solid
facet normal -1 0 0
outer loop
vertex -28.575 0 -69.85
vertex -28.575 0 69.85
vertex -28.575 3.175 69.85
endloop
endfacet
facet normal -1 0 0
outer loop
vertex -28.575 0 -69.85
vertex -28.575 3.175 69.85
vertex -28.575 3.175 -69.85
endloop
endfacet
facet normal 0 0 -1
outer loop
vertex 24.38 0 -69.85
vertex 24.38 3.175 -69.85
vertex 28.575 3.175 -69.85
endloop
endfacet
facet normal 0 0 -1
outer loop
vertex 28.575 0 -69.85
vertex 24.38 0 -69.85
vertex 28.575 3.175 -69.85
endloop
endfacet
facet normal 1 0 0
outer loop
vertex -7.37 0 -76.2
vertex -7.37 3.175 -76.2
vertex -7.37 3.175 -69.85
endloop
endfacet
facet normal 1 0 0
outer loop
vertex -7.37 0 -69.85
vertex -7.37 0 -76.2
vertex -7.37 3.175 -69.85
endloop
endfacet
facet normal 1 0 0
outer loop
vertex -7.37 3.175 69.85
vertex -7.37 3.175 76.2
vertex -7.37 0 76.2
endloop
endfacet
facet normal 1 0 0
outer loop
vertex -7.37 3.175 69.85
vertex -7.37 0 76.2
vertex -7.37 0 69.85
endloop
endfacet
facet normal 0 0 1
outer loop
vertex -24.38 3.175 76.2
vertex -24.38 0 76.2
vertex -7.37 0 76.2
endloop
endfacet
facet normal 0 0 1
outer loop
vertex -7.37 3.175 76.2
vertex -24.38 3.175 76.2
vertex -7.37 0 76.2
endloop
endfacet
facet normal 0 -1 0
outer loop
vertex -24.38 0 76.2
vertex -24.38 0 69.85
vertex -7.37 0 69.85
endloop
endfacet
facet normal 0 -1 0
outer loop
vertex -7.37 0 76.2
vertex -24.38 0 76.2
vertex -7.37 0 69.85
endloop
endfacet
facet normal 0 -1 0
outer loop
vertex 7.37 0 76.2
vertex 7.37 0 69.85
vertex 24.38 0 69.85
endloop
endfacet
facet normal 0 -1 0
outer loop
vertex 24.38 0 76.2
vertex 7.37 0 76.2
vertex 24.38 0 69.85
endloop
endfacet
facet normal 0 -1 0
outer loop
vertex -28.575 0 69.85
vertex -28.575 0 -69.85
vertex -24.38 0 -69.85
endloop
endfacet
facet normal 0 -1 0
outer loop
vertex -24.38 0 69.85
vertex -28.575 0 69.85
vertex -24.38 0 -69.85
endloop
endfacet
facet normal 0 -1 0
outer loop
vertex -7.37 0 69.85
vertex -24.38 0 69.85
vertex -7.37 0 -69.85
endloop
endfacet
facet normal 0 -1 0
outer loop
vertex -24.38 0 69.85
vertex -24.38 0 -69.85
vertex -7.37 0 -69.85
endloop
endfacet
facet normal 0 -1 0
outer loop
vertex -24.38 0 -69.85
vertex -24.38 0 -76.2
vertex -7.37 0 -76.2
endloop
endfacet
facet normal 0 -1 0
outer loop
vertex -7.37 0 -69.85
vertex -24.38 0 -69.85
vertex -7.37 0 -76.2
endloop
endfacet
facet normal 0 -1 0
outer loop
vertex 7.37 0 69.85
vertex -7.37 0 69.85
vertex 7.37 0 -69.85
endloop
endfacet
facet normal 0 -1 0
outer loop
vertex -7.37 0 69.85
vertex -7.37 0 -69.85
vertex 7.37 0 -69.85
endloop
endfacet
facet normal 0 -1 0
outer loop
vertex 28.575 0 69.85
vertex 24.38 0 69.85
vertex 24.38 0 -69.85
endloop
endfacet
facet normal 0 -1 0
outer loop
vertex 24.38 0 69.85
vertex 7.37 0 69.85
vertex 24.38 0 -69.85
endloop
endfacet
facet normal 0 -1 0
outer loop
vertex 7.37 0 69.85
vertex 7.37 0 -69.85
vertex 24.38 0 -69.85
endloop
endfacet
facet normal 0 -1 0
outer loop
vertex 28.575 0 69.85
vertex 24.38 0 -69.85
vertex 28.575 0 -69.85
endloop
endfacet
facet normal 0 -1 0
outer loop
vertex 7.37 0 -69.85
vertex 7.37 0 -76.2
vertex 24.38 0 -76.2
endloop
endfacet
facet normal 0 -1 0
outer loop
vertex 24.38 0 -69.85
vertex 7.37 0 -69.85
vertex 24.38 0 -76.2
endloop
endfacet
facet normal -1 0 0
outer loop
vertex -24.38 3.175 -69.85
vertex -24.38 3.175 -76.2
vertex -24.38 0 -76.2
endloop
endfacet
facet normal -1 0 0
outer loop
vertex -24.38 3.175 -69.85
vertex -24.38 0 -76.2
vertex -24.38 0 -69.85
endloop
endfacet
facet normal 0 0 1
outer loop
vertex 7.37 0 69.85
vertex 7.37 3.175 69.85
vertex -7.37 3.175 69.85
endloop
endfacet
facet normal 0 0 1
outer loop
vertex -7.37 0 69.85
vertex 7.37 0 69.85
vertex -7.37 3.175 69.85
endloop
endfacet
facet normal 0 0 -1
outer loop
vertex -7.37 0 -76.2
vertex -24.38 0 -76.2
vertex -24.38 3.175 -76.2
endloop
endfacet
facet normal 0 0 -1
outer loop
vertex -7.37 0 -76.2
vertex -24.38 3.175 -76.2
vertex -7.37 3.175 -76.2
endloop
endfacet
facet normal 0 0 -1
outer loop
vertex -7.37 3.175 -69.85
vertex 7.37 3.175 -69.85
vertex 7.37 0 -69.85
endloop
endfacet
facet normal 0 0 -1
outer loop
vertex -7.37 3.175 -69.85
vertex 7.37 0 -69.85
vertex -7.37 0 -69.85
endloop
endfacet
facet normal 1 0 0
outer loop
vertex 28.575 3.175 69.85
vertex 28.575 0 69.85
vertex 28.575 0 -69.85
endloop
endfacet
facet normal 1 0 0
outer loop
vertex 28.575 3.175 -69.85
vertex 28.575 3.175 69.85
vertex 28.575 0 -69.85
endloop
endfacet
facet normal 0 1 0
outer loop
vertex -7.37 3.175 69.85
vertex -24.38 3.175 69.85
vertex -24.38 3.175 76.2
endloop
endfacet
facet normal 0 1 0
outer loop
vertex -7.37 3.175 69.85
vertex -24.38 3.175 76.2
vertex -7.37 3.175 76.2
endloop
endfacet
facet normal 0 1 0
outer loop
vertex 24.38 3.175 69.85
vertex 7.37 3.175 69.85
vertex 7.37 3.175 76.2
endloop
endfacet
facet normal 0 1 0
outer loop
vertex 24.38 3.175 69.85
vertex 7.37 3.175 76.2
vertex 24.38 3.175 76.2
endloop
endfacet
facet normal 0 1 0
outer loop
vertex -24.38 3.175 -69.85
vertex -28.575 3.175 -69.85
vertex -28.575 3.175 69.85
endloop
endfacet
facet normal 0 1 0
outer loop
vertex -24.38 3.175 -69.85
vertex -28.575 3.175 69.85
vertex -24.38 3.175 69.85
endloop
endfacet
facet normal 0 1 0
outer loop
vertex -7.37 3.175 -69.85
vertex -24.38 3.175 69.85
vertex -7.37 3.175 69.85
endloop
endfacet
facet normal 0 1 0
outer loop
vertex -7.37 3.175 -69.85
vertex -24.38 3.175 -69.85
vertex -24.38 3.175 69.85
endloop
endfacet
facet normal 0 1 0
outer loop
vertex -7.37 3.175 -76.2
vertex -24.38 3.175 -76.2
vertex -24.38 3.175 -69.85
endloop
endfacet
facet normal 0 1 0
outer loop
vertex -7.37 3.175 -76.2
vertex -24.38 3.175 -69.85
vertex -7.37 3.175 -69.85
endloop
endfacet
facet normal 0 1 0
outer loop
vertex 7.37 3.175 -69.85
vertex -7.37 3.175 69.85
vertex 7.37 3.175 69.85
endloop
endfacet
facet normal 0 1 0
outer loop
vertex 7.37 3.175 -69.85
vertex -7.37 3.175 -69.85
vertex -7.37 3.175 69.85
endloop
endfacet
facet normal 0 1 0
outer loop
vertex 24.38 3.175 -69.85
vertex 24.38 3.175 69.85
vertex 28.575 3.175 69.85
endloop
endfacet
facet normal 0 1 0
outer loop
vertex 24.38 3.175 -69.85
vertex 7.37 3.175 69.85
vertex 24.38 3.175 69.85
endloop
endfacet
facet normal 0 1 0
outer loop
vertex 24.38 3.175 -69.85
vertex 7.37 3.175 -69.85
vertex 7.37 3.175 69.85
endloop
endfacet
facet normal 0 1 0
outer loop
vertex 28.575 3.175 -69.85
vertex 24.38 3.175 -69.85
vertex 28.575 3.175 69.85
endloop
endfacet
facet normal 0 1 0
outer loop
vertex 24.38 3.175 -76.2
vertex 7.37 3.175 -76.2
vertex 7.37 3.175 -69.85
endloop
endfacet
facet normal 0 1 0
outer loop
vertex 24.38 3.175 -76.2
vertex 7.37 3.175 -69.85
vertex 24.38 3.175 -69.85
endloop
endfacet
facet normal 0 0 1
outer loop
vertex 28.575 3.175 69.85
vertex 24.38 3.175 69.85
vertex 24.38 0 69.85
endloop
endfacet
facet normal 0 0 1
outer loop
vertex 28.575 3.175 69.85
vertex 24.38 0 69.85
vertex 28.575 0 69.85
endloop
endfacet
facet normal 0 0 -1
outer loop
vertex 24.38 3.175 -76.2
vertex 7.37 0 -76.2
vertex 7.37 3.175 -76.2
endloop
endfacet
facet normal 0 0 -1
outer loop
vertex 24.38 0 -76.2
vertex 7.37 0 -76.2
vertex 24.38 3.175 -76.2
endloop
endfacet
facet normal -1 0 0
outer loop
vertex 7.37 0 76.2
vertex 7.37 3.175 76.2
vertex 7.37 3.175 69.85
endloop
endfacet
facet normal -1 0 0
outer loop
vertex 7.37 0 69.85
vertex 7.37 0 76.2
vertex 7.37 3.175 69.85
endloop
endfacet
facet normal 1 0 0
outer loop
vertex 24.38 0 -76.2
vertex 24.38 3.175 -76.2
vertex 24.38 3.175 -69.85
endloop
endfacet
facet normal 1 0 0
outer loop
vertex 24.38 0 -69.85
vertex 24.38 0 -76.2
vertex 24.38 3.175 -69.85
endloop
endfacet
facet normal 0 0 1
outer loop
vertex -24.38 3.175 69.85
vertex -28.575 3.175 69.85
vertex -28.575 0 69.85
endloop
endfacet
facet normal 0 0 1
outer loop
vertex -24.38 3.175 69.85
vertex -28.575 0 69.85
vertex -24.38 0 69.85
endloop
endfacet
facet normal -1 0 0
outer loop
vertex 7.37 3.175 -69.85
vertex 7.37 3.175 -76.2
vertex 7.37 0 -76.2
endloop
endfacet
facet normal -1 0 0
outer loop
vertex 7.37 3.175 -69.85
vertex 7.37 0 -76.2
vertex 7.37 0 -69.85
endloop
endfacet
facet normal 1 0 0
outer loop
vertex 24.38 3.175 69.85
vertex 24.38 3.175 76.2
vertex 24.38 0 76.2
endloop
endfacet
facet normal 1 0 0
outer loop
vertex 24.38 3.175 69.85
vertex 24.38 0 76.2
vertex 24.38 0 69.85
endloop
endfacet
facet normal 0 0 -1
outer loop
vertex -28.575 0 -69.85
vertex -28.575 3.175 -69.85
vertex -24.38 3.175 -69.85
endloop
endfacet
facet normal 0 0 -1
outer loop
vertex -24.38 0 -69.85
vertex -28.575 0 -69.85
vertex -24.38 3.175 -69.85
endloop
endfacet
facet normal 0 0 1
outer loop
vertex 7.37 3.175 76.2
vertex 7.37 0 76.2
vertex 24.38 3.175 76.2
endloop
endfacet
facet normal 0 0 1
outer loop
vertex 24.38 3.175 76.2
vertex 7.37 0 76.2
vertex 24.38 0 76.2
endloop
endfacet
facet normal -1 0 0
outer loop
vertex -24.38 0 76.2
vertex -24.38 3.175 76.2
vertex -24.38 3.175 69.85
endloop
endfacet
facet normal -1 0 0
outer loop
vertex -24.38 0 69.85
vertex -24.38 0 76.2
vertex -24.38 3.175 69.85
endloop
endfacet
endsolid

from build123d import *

# Parameters (mm, degrees)
SKETCH1_W           = 57.15
SKETCH1_H           = 152.4
BOSS_EXTRUDE1_DEPTH = 3.175
SKETCH2_W           = 4.195
SKETCH2_H           = 6.35
SKETCH2_W_2         = 7.37
CUT_EXTRUDE1_DEPTH  = 4.175


with BuildPart() as part:
    # Sketch1 → Boss-Extrude1 (new body)
    with BuildSketch(Plane(origin=(0, 0, 0), x_dir=(1, 0, 0), z_dir=(0, 1, 0))):
        Rectangle(SKETCH1_W, SKETCH1_H)
    extrude(amount=BOSS_EXTRUDE1_DEPTH)

    # Sketch2 → Cut-Extrude1 (cut, through all)
    with BuildSketch(Plane(origin=(0, 3.175, 0), x_dir=(1, 0, 0), z_dir=(0, 1, 0))):
        with Locations((-26.4775, -73.025)):
            Rectangle(SKETCH2_W, SKETCH2_H)
        with Locations((-3.685, -73.025)):
            Rectangle(SKETCH2_W_2, SKETCH2_H)
        with Locations((3.685, -73.025)):
            Rectangle(SKETCH2_W_2, SKETCH2_H)
        with Locations((26.4775, -73.025)):
            Rectangle(SKETCH2_W, SKETCH2_H)
    cut_extrude1 = extrude(amount=-CUT_EXTRUDE1_DEPTH, mode=Mode.SUBTRACT)

    # Mirror1: Cut-Extrude1 across plane
    add(cut_extrude1.mirror(Plane.XY), mode=Mode.SUBTRACT)


solid = part.part
